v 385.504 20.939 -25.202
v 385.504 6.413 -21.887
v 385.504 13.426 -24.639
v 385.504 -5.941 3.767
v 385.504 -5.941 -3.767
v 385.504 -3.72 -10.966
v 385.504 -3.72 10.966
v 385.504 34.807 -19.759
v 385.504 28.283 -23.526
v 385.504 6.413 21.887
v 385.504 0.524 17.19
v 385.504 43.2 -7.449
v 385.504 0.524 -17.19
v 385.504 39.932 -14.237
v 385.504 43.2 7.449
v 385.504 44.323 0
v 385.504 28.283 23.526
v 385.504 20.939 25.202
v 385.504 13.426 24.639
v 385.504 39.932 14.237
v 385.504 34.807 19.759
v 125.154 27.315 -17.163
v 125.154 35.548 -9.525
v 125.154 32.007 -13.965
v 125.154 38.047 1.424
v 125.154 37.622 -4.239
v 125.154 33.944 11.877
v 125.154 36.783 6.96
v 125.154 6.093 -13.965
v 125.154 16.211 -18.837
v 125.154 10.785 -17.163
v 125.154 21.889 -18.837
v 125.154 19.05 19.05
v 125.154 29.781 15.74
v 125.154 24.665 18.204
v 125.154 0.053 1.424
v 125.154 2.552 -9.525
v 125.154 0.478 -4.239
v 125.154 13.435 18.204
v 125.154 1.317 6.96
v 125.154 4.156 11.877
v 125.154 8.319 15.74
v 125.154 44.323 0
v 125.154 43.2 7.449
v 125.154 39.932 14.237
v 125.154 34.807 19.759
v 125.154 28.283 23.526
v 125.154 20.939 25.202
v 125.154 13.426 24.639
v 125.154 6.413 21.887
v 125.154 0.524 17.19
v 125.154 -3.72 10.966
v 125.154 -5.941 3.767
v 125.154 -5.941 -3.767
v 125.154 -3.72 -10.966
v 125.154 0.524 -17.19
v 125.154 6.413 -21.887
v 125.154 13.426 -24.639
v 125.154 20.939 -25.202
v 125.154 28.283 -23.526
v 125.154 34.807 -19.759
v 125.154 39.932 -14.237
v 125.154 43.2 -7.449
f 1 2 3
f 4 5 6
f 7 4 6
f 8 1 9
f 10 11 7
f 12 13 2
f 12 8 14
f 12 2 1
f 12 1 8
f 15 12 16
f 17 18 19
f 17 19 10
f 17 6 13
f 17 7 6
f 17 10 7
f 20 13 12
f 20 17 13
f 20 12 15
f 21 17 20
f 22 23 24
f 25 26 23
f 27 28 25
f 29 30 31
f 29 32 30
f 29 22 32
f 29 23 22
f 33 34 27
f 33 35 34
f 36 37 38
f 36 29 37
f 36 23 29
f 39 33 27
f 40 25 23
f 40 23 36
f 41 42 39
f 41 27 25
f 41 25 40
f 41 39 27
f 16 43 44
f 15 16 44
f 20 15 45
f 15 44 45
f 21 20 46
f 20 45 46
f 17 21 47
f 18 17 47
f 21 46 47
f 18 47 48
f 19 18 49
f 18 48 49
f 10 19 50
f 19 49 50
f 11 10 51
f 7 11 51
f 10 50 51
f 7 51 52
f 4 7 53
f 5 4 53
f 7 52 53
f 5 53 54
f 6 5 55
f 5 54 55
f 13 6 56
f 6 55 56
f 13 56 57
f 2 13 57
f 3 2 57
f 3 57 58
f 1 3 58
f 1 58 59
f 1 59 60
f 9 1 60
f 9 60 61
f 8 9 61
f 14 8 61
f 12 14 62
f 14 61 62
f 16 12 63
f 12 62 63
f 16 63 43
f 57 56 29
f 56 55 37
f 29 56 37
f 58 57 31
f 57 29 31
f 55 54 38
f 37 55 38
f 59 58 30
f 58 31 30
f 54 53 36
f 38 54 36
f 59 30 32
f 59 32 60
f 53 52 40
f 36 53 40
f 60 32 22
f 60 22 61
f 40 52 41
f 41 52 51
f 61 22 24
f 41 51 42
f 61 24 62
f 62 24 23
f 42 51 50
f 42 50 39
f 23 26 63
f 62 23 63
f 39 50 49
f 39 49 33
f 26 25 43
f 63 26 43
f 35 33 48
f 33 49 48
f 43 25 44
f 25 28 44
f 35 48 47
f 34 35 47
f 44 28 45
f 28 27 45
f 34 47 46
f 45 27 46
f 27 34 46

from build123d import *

# Parameters (mm, degrees)
SKETCH1_W               = 396.24
SKETCH1_H               = 19.05
CUT_EXTRUDE1_DEPTH      = 101.6
CUT_EXTRUDE1_DEPTH_BACK = 69.088
F_3DSKETCH2_R           = 25.273
BOSS_EXTRUDE1_DEPTH     = 260.35


with BuildPart() as part:
    # Sketch1 → Revolve1 (revolve)
    with BuildSketch(Plane.XY):
        with Locations((178.556917264, 9.525)):
            Rectangle(SKETCH1_W, SKETCH1_H)
    revolve(axis=Axis((-62.064477949, 19.05, 0), (1, 0, 0)))

    # 3DSketch1 → Cut-Extrude1 (cut, two sides: drawn at the far end of the back side and taken through both)
    with BuildSketch(Plane(origin=(125.15372202, 38.1, 0), x_dir=(-0.9587579392690639, -0.2842238798703196, 0), z_dir=(0, 0, -1)).offset(-CUT_EXTRUDE1_DEPTH_BACK)):
        Polygon((0, 0), (12.838737839, -43.308260512), (158.928287458, 0), (141.370884548, 59.225493089), (-6.410822017, 15.415592494), align=None)
    extrude(amount=CUT_EXTRUDE1_DEPTH + CUT_EXTRUDE1_DEPTH_BACK, mode=Mode.SUBTRACT)

    # 3DSketch2 → Boss-Extrude1 (add)
    with BuildSketch(Plane(origin=(125.15372202, 19.05, 0), x_dir=(0, 0, 1), z_dir=(1, 0, 0))):
        Circle(F_3DSKETCH2_R)
    extrude(amount=BOSS_EXTRUDE1_DEPTH)


solid = part.part
